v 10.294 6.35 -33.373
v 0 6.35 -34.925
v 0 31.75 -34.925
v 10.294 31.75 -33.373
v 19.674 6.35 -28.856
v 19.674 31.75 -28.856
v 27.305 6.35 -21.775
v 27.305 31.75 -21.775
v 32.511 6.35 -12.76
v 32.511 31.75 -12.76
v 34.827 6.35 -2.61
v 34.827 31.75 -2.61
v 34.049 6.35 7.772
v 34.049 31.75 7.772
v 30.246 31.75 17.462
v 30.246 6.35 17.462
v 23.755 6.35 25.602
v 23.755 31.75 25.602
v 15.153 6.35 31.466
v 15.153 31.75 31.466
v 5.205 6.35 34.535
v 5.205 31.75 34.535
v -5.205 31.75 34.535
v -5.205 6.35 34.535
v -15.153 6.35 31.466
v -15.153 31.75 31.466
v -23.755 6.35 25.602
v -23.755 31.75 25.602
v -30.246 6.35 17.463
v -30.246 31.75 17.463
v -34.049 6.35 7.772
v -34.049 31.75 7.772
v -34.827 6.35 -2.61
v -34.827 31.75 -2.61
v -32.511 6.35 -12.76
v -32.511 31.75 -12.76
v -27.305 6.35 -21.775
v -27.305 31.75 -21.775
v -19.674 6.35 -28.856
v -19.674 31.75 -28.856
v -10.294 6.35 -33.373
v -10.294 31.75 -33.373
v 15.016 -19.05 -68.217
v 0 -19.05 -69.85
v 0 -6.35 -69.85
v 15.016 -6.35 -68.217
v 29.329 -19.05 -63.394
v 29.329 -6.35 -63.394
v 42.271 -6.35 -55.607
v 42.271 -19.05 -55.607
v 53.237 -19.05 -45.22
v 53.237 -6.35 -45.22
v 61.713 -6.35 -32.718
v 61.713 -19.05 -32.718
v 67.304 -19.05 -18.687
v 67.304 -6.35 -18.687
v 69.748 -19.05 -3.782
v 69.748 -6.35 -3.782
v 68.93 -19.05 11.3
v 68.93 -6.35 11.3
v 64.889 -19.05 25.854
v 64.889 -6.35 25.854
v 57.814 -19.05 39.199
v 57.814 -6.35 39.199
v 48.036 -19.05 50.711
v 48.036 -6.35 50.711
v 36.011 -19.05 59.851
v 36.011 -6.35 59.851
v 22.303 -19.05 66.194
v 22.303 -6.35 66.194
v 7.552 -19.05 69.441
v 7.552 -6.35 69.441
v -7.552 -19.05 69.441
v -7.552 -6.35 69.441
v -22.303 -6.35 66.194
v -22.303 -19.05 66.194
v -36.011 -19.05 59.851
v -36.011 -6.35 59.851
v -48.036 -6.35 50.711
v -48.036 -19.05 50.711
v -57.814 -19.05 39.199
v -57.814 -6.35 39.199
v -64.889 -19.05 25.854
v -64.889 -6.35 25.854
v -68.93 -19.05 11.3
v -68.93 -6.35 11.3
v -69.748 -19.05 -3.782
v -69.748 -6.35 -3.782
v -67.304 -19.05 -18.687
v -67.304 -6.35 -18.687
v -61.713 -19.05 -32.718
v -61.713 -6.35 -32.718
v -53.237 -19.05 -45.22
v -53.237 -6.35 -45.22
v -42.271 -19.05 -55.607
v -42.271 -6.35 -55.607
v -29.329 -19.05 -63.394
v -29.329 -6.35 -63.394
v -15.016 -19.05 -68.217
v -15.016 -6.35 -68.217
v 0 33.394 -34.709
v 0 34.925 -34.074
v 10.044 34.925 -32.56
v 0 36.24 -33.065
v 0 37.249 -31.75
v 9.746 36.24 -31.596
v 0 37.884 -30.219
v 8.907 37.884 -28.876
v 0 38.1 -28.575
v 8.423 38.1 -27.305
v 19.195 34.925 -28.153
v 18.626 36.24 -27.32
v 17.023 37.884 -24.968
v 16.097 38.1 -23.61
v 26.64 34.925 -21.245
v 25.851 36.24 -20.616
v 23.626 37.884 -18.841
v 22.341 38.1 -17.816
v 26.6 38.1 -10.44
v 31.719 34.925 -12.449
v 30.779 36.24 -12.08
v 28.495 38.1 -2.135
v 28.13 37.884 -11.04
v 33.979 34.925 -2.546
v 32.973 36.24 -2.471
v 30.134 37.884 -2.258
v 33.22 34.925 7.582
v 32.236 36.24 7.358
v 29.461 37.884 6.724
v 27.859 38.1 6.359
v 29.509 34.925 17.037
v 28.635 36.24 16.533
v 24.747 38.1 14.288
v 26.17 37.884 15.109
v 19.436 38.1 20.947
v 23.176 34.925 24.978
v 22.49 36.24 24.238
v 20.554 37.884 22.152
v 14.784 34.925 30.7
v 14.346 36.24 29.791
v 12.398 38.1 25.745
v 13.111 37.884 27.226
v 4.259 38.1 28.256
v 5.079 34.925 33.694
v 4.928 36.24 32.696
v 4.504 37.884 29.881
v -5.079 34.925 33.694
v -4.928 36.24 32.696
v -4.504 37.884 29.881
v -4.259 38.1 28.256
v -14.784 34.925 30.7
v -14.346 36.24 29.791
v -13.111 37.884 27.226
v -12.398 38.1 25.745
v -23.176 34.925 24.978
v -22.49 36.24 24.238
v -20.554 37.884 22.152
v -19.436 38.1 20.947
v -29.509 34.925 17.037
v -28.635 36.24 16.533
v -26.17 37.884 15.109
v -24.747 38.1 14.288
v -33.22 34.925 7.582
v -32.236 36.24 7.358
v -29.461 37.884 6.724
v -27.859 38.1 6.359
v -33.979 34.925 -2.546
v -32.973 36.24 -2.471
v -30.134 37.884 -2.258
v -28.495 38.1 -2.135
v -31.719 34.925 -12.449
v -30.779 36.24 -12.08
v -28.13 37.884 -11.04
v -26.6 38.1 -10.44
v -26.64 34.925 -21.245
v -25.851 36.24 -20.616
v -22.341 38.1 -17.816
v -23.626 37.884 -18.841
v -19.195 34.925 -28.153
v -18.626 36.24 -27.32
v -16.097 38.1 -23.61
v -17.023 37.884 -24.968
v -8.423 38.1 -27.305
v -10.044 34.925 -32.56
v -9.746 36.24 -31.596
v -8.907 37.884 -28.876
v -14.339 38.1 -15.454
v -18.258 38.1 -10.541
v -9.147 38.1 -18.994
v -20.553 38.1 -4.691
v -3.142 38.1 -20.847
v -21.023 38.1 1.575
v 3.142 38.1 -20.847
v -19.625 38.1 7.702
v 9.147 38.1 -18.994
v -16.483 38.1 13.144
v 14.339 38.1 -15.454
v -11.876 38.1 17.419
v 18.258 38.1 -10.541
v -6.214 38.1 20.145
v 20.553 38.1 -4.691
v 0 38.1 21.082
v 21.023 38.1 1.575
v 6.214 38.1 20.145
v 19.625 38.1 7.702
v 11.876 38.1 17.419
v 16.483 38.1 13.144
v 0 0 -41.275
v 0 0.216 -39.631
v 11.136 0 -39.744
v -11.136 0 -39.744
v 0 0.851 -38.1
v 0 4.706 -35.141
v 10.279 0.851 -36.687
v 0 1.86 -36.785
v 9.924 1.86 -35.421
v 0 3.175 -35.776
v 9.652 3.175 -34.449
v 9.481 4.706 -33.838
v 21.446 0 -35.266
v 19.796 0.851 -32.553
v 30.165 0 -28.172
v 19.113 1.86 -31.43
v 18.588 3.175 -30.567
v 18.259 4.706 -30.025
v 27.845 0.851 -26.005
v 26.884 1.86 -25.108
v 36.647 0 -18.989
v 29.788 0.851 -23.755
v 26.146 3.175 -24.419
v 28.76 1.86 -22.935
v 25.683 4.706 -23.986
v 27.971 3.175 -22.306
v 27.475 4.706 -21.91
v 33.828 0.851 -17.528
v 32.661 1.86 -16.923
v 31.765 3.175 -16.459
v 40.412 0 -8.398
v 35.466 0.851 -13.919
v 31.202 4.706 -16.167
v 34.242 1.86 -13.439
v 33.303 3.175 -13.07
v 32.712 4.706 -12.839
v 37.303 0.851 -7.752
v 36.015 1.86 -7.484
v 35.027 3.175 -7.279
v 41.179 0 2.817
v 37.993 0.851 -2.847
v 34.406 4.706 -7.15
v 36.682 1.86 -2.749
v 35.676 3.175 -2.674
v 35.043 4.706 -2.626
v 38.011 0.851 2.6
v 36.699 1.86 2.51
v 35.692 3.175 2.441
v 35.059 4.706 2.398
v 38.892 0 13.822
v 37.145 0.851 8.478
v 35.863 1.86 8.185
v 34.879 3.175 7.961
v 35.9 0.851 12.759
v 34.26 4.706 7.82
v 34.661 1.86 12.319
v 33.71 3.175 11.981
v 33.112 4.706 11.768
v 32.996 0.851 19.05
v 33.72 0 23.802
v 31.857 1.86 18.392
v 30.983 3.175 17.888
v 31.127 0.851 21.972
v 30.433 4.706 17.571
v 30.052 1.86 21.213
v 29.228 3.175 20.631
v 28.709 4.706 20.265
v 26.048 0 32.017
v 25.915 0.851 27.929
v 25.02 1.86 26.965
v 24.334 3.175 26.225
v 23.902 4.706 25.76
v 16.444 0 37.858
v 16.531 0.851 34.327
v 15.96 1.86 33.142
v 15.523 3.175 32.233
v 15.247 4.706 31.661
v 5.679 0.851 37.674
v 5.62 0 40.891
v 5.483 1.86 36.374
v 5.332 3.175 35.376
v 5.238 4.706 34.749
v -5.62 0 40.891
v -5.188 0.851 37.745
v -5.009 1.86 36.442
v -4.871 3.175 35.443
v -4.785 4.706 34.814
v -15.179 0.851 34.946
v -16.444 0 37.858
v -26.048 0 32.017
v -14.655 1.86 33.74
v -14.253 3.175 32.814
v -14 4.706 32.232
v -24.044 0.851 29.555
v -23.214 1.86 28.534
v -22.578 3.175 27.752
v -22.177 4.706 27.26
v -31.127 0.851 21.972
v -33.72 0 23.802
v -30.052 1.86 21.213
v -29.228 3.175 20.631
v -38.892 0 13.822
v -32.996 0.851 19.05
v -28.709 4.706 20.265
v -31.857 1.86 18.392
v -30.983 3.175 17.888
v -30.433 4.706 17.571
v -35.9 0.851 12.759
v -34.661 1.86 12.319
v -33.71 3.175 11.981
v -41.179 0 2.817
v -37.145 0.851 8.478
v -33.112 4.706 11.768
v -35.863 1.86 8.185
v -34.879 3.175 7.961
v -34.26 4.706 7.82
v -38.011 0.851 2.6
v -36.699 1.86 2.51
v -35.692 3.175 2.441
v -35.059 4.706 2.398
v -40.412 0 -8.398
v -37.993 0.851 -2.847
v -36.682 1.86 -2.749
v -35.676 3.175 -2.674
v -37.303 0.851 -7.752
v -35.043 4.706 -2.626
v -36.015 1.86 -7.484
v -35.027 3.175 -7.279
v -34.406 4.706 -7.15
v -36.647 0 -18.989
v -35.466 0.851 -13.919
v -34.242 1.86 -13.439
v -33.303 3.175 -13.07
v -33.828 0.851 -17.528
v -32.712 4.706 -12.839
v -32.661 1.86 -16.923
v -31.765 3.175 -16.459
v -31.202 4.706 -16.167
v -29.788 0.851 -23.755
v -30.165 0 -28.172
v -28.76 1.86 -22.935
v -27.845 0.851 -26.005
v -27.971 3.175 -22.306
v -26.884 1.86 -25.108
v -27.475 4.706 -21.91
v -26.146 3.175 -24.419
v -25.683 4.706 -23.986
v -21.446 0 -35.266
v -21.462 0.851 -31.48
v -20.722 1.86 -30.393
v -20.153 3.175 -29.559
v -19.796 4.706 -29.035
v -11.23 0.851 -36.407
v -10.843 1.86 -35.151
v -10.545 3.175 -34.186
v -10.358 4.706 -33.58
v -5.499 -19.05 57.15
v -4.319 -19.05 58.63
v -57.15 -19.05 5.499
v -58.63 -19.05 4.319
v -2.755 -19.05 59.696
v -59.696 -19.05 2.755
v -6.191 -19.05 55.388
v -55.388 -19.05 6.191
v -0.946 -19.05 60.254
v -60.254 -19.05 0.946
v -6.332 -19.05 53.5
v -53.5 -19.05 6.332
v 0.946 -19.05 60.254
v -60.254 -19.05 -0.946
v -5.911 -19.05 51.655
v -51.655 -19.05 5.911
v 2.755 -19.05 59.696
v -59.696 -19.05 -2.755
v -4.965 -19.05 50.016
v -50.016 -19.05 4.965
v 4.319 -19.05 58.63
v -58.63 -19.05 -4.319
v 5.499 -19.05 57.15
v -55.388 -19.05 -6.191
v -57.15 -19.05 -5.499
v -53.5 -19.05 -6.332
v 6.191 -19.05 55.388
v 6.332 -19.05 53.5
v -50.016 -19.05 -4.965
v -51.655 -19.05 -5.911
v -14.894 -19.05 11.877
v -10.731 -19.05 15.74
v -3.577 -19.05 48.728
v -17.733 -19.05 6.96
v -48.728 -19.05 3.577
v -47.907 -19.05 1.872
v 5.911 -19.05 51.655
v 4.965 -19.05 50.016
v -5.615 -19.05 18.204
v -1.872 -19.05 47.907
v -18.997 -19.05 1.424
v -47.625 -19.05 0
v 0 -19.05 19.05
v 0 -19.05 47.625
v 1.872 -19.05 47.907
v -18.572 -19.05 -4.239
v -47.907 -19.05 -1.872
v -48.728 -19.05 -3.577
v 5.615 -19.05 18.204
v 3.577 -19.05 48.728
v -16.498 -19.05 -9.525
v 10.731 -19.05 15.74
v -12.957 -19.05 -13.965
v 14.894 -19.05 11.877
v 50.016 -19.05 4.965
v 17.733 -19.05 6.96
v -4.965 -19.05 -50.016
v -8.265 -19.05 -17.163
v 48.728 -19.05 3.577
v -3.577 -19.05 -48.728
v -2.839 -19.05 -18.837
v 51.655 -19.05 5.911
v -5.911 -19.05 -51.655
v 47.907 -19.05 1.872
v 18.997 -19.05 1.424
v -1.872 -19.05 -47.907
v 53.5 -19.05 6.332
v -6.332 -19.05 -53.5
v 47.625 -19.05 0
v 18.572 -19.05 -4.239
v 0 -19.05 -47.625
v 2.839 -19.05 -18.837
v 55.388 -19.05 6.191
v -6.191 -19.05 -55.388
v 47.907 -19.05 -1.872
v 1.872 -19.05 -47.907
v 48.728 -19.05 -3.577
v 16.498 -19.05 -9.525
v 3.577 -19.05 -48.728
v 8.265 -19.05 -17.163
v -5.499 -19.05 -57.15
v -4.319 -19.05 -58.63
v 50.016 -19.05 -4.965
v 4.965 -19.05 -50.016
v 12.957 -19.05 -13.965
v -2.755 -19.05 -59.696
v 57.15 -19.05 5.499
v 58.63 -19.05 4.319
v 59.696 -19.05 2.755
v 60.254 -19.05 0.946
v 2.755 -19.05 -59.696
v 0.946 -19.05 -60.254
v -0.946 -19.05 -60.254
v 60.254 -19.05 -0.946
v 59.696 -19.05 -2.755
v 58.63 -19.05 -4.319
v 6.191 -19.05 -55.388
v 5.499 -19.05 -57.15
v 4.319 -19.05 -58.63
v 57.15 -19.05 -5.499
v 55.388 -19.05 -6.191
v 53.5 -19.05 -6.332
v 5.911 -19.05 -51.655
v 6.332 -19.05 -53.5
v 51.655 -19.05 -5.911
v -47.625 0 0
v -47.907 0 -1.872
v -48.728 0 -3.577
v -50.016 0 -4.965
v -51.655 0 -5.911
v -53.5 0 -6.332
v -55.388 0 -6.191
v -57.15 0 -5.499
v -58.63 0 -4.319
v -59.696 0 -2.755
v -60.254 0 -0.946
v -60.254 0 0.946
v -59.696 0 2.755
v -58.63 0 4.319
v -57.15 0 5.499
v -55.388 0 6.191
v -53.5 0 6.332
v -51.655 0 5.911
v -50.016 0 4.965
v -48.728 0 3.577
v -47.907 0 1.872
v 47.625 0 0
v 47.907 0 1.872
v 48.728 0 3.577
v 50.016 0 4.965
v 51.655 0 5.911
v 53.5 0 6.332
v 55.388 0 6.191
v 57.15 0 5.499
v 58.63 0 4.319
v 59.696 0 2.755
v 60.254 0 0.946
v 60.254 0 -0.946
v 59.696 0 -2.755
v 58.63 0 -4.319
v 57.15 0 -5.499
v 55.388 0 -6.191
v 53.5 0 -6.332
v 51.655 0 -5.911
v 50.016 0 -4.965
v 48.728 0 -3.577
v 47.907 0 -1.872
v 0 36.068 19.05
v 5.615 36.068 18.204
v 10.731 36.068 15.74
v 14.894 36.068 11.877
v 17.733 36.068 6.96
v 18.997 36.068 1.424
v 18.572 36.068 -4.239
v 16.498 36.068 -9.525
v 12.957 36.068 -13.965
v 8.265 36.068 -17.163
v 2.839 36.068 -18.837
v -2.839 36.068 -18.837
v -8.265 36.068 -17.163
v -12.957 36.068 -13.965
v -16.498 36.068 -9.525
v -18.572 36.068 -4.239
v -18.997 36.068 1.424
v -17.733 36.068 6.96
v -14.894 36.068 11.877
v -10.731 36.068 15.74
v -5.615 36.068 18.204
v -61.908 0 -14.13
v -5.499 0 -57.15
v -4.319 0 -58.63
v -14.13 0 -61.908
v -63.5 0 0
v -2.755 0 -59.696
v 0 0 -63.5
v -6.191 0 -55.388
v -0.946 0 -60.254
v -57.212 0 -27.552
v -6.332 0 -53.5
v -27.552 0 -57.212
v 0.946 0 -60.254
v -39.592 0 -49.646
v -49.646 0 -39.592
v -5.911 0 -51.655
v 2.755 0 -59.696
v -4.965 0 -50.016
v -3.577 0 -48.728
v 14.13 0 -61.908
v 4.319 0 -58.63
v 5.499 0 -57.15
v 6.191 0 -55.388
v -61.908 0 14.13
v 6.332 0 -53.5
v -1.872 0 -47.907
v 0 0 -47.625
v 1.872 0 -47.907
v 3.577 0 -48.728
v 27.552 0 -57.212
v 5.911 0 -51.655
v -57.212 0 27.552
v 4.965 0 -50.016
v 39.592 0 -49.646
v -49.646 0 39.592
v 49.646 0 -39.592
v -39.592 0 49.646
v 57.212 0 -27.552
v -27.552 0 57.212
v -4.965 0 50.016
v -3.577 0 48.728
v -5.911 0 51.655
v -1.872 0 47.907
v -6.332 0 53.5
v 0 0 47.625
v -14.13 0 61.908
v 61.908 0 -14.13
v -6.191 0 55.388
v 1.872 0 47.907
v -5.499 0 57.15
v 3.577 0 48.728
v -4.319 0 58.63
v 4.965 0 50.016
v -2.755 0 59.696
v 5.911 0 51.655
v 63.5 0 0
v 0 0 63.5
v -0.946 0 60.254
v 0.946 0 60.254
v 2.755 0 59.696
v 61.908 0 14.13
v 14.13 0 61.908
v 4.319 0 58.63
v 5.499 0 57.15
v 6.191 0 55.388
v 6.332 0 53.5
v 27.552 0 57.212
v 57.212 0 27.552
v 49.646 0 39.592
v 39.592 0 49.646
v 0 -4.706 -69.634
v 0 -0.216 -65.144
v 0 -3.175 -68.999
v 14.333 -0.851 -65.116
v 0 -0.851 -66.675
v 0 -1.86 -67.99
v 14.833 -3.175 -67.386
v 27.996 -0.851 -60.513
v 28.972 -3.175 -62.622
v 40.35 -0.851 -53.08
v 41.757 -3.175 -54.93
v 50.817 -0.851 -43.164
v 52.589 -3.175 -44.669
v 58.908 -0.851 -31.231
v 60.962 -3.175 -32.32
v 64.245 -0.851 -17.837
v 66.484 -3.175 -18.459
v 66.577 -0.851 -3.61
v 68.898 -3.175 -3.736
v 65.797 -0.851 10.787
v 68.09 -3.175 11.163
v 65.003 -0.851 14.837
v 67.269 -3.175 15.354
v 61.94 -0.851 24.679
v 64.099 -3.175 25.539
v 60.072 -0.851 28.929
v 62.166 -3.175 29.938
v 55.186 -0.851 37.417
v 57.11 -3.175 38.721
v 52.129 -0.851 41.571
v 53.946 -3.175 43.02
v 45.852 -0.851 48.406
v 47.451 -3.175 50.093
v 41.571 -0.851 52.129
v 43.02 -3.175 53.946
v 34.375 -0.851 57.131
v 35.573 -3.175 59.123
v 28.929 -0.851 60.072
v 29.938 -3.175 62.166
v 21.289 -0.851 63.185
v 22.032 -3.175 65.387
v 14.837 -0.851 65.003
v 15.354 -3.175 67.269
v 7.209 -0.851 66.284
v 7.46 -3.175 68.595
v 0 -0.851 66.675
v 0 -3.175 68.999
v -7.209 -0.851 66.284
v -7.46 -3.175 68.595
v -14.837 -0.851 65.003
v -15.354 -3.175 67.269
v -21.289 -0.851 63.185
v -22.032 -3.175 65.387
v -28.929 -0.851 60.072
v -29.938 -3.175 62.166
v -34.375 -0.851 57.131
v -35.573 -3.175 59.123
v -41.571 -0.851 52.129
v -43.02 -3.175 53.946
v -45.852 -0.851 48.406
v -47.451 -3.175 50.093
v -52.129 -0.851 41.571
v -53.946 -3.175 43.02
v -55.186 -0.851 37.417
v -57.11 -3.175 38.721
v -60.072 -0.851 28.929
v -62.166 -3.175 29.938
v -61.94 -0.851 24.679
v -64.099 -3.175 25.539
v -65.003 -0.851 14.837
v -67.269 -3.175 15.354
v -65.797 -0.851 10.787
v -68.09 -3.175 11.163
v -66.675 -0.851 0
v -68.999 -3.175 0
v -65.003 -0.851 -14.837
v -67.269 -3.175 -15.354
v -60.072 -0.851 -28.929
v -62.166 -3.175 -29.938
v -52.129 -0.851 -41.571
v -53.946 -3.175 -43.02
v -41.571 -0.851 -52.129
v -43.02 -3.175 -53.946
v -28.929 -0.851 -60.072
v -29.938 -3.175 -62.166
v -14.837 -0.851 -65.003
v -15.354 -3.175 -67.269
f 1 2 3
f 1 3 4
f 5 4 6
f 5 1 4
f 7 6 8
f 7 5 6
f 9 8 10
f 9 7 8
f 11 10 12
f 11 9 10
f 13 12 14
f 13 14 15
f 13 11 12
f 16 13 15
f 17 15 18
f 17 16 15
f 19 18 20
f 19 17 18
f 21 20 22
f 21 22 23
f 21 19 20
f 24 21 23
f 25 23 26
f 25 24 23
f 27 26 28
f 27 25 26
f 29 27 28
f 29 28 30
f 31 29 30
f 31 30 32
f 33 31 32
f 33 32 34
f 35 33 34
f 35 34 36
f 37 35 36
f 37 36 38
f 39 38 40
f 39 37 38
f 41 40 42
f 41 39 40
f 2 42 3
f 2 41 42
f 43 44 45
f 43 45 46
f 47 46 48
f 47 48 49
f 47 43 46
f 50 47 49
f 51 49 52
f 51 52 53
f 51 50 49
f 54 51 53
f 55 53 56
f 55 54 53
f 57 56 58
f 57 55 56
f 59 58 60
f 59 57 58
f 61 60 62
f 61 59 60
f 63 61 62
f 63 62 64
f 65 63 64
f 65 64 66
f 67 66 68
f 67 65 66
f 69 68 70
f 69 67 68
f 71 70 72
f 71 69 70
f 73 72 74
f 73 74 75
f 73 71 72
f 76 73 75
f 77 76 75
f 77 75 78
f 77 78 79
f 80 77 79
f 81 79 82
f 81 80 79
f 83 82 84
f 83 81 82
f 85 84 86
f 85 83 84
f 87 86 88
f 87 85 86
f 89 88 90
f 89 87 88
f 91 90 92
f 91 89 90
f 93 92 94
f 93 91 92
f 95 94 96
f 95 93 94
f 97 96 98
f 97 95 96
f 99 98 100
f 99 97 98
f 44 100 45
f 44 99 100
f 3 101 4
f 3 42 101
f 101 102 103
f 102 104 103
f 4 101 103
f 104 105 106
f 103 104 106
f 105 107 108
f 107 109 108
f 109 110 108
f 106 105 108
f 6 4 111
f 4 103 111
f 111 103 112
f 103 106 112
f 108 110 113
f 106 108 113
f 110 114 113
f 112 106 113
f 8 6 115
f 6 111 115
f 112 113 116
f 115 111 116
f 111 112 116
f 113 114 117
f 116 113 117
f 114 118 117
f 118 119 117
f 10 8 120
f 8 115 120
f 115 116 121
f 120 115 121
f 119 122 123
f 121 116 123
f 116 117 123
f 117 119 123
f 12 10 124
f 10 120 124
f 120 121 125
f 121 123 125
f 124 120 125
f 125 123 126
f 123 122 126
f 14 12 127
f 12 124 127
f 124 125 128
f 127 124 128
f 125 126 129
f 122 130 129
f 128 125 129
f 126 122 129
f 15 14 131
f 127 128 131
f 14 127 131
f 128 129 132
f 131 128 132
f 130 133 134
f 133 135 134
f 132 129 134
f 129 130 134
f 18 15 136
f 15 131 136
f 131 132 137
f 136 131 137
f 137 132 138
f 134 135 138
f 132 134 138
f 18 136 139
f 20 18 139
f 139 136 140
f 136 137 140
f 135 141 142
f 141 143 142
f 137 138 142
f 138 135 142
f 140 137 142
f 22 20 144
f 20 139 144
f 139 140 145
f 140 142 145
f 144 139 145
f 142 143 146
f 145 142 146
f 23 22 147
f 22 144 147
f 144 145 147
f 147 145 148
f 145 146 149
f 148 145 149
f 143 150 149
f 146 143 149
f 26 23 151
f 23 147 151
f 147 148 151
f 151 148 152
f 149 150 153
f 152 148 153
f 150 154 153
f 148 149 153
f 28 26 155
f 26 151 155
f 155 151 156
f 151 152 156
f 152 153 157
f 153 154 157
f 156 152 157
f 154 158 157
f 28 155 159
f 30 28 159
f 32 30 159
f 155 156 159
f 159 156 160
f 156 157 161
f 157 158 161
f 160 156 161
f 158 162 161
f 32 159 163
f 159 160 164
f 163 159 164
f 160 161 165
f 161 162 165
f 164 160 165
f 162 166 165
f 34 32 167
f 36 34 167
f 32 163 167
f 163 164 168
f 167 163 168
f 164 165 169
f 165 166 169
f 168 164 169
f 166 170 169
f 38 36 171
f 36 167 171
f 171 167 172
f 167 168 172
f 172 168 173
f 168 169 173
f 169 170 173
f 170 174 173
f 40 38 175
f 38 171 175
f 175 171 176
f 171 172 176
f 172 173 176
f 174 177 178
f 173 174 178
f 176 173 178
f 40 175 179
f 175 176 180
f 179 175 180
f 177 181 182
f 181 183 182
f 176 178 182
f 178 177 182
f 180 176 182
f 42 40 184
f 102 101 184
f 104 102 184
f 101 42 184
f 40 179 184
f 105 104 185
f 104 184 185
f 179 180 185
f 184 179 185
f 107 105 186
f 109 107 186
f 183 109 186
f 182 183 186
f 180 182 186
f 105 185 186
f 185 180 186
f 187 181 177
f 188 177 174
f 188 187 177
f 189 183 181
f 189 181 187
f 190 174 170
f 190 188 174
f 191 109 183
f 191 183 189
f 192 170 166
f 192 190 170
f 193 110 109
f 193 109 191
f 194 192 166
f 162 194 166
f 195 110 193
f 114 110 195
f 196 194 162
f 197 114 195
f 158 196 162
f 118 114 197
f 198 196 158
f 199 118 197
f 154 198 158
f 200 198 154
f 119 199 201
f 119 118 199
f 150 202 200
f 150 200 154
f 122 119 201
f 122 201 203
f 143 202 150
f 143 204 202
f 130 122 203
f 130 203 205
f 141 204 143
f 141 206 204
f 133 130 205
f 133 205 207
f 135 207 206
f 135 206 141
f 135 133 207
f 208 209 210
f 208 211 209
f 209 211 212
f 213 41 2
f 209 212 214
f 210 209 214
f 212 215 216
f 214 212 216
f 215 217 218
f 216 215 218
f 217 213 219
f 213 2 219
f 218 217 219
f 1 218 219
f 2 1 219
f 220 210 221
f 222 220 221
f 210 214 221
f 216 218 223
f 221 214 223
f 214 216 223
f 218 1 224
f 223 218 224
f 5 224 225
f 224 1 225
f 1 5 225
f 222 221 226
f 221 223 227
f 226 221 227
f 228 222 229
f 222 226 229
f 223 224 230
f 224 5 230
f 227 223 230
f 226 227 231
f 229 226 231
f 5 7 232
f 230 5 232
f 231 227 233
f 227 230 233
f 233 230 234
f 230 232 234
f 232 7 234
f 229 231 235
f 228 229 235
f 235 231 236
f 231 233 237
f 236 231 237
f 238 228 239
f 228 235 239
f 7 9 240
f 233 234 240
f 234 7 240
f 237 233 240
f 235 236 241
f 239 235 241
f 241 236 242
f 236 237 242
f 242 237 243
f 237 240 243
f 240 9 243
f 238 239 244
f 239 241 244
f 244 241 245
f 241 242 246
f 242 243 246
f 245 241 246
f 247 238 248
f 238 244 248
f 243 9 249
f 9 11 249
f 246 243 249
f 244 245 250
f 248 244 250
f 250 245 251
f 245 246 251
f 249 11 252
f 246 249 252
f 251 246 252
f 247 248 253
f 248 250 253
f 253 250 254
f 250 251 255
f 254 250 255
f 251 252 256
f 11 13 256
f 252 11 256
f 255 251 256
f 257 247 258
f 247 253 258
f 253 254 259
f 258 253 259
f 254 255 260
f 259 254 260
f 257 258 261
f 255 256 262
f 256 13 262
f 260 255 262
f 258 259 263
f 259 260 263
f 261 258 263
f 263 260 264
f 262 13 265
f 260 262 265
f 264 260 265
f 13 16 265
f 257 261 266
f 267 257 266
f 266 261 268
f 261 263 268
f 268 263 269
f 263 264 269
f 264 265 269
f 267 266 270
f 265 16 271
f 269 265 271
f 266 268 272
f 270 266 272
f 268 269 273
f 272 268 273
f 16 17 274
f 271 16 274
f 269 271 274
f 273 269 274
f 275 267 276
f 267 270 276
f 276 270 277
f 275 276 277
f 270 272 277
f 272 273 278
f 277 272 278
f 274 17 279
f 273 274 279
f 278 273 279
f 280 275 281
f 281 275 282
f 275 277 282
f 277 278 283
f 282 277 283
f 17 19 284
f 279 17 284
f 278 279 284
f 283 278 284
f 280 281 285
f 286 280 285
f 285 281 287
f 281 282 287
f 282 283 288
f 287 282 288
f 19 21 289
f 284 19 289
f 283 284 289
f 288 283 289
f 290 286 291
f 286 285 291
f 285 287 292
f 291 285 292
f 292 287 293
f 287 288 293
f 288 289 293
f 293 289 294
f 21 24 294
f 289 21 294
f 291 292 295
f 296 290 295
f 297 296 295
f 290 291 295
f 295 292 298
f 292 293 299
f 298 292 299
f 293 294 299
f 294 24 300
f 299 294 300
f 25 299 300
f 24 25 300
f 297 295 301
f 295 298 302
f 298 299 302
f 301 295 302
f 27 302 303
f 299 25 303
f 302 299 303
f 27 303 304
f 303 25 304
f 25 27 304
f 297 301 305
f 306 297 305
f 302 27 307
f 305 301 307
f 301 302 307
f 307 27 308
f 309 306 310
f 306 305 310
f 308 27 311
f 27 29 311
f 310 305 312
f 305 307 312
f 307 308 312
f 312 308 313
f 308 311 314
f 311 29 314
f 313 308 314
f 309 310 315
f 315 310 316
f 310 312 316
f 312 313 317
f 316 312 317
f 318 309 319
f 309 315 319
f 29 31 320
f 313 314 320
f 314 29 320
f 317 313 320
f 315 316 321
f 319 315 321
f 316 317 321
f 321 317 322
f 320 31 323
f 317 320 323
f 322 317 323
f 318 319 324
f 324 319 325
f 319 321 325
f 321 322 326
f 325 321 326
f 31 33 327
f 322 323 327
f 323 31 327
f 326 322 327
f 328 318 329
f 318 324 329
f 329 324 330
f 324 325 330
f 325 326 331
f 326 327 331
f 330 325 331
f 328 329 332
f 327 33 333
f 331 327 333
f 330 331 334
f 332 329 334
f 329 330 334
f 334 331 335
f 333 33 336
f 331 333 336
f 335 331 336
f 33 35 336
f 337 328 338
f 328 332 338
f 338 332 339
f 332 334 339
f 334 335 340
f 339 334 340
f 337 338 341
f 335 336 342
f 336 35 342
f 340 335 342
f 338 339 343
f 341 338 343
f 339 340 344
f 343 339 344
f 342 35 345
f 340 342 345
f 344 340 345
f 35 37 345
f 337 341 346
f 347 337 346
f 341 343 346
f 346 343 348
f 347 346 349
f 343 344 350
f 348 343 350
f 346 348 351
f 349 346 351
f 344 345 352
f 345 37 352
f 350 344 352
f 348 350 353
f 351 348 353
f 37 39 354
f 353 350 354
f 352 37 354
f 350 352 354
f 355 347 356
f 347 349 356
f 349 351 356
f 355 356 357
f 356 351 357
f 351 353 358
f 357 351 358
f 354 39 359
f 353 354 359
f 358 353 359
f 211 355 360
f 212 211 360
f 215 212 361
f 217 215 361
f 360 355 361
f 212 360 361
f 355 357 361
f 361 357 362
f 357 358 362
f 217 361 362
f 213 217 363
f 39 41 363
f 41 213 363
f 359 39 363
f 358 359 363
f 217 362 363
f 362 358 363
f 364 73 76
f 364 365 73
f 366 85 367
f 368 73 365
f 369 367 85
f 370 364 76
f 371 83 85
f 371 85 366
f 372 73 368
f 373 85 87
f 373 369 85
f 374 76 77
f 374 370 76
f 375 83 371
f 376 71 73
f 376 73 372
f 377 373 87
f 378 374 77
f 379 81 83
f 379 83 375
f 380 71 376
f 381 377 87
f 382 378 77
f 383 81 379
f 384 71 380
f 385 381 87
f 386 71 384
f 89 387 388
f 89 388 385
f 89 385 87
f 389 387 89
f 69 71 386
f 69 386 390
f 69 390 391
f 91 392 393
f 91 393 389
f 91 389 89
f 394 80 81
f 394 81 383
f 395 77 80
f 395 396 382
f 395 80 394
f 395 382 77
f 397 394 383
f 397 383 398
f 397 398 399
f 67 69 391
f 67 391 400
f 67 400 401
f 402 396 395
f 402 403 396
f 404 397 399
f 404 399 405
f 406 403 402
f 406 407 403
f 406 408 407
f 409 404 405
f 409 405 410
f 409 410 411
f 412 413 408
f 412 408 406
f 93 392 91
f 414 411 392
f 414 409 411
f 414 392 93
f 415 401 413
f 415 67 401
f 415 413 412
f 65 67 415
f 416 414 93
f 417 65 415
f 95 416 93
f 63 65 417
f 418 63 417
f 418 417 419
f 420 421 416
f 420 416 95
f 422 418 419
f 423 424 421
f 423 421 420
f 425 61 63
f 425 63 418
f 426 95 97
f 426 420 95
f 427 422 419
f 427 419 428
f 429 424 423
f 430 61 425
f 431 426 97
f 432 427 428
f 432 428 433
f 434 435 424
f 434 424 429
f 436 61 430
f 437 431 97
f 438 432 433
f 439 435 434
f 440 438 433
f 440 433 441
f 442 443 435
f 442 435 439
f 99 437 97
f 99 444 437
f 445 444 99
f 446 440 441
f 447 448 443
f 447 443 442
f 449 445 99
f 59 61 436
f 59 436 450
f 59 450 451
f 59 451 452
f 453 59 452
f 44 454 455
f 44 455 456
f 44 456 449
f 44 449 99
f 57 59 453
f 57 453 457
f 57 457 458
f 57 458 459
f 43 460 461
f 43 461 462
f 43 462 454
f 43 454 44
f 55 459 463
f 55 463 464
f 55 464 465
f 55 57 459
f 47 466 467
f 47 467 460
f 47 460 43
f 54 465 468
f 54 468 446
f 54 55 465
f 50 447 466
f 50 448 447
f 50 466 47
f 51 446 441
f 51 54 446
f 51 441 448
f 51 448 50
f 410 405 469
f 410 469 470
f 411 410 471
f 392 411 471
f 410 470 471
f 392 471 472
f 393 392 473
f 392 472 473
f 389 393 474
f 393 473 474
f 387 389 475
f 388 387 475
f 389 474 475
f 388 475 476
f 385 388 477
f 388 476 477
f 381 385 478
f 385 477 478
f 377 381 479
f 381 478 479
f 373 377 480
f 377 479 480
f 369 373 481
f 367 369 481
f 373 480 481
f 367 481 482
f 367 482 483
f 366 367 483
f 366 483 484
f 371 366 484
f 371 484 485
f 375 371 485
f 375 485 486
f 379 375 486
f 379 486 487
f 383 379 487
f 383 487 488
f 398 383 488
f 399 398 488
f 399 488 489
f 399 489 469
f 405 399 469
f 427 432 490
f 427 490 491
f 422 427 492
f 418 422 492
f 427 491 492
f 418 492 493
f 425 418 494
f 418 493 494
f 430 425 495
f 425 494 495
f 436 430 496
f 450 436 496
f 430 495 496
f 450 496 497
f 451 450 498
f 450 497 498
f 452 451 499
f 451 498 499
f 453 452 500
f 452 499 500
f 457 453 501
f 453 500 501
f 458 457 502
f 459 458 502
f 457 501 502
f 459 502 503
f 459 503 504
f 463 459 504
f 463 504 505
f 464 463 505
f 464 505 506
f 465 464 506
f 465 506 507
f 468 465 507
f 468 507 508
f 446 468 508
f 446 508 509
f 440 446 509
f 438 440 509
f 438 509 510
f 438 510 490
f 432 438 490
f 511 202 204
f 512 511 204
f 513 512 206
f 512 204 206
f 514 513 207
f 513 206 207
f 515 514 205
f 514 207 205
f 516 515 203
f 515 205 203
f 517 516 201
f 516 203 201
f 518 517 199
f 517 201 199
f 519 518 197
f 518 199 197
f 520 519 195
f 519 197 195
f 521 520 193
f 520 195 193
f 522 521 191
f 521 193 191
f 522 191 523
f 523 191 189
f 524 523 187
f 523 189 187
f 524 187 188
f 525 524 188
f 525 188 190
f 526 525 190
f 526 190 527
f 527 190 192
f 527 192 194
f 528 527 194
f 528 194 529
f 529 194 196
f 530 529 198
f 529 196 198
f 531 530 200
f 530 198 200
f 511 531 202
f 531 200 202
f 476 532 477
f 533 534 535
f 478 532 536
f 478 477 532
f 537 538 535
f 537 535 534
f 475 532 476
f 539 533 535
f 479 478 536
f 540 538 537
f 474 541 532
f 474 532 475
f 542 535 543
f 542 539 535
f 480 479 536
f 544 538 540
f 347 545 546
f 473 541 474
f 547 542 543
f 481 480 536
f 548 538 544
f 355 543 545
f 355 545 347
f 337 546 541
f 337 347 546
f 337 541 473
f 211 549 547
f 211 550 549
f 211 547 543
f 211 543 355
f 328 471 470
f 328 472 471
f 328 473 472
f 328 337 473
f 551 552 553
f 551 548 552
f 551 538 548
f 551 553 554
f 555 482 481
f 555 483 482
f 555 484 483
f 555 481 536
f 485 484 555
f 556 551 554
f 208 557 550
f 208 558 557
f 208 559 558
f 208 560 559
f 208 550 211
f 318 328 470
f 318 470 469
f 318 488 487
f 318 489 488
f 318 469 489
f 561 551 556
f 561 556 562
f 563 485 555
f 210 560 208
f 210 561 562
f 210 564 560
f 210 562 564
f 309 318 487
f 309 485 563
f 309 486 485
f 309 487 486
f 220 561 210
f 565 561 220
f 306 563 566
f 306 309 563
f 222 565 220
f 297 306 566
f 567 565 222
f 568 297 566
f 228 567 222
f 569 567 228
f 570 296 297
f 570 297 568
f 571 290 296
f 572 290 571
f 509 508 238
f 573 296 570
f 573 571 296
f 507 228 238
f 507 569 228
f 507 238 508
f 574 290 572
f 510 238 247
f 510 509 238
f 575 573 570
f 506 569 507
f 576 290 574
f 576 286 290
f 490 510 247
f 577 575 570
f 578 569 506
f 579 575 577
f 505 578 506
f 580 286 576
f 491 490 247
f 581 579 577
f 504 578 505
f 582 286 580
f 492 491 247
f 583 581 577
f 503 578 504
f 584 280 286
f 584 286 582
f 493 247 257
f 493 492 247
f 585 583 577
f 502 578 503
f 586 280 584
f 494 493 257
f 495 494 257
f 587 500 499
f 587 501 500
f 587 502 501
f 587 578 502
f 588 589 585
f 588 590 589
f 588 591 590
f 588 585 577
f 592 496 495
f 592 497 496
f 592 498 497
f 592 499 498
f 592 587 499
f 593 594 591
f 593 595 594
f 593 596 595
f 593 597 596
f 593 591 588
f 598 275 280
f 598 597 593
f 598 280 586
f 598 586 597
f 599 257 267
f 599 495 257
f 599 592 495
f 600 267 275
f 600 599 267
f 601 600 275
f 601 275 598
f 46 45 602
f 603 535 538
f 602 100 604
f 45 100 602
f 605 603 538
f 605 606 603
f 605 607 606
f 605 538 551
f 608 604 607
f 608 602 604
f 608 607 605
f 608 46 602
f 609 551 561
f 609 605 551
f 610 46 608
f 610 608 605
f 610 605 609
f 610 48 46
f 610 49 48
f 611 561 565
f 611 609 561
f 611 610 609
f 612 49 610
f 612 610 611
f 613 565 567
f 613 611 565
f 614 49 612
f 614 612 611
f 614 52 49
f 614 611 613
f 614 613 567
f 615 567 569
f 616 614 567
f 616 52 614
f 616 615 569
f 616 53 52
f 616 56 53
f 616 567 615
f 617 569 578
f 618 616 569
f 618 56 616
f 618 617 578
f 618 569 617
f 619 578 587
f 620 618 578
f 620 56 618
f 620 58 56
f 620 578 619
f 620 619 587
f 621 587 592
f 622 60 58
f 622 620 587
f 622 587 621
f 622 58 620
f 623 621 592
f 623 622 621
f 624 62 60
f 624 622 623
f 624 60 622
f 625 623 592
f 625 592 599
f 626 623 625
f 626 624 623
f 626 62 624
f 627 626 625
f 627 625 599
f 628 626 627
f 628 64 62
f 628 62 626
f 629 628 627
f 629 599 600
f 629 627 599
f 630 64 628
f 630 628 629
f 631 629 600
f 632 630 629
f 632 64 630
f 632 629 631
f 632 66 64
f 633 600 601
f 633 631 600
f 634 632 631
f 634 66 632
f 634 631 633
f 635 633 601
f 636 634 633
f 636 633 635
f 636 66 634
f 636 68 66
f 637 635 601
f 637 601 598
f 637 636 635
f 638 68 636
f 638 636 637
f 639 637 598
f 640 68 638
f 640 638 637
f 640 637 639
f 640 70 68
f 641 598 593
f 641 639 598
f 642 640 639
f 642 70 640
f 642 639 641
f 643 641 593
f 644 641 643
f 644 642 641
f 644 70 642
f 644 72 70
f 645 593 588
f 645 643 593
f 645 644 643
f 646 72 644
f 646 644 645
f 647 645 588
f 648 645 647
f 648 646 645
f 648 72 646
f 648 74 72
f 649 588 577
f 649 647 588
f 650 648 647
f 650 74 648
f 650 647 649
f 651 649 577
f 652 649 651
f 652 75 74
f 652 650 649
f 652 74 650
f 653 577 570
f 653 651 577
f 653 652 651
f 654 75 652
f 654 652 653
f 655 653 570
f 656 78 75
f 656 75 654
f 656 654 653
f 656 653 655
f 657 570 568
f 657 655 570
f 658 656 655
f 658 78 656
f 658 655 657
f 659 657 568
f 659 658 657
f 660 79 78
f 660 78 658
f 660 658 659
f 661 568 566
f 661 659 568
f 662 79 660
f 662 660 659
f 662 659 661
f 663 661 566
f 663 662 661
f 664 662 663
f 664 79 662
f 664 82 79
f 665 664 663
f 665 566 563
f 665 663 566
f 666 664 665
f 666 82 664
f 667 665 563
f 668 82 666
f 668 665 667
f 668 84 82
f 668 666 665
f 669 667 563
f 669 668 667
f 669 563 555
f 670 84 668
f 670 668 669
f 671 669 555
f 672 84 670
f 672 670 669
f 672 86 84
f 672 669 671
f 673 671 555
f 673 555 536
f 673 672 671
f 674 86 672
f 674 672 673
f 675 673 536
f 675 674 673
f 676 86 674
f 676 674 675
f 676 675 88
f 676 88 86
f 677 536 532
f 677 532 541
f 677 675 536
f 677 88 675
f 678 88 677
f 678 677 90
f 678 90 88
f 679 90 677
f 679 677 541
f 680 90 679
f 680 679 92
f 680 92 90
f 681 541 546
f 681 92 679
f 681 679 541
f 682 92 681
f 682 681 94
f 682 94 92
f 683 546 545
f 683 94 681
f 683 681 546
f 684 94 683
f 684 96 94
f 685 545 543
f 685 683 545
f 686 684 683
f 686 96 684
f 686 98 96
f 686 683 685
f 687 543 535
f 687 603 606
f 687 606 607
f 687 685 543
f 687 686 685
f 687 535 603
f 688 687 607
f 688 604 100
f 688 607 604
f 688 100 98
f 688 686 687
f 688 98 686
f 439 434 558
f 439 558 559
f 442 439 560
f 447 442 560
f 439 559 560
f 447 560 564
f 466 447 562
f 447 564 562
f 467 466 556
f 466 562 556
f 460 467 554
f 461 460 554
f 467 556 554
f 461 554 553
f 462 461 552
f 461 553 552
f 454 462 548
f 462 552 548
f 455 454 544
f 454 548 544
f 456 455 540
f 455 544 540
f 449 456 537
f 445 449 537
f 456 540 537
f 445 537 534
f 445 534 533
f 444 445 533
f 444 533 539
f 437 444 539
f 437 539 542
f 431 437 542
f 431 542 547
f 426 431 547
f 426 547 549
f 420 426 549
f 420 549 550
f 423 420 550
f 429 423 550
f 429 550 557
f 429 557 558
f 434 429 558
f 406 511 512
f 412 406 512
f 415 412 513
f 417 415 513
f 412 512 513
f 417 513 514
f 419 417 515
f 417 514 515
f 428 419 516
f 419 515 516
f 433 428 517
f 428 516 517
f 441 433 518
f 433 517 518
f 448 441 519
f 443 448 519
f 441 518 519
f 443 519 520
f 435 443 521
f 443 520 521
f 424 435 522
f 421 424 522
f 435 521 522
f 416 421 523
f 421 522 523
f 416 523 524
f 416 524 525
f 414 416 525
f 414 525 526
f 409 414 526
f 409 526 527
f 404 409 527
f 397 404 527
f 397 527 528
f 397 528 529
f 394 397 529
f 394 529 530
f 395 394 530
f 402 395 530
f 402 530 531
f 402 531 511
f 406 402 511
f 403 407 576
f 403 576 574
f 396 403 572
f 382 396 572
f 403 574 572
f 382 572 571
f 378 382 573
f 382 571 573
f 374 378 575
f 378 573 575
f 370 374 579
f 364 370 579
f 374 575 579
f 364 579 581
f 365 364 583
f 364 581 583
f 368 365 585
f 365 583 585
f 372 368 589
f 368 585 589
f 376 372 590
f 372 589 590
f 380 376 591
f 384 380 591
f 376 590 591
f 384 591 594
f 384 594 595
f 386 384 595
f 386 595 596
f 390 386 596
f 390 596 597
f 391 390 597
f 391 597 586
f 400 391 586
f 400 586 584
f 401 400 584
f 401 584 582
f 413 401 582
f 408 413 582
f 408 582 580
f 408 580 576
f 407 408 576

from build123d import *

# Parameters (mm, degrees)
SKETCH8_R          = 19.05
CUT_EXTRUDE2_DEPTH = 115.123474798
SKETCH9_R          = 6.35
CUT_EXTRUDE3_DEPTH = 106.875658203
CIRPATTERN1_COUNT  = 4
FILLET1_R          = 6.35
CHAMFER1_SIZE      = 2.032


with BuildPart() as part:
    # Sketch7 → Revolve1 (revolve)
    with BuildSketch(Plane.XY, mode=Mode.PRIVATE) as revolve1_sk:
        Polygon((34.925, 0), (69.85, 0), (69.85, -19.05), (0, -19.05), (0, 0), (0, 38.1), (34.925, 38.1), align=None)
    revolve(revolve1_sk.sketch.rotate(Axis((0, 38.1, 0), (0, -1, 0)), 270), axis=Axis((0, 38.1, 0), (0, -1, 0)))

    # Sketch8 → Cut-Extrude2 (cut, through all)
    with BuildSketch(Plane(origin=(0, 38.1, 0), x_dir=(1, 0, 0), z_dir=(0, 1, 0))):
        with Locations(Location((0, 0, 0), (0, 0, 270))):
            Circle(SKETCH8_R)
    extrude(amount=-CUT_EXTRUDE2_DEPTH, mode=Mode.SUBTRACT)

    # Sketch9 → Cut-Extrude3 (cut, through all)
    with BuildSketch(Plane(origin=(0, 0, 0), x_dir=(1, 0, 0), z_dir=(0, 1, 0))):
        with Locations(Location((0, 53.975, 0), (0, 0, 270))):
            Circle(SKETCH9_R)
    cut_extrude3 = extrude(amount=-CUT_EXTRUDE3_DEPTH, mode=Mode.SUBTRACT)

    # CirPattern1: Cut-Extrude3 ×4 about axis
    cirpattern1_axis = Axis((0, 0, 0), (0, 1, 0))
    for i in range(1, CIRPATTERN1_COUNT):
        add(cut_extrude3.rotate(cirpattern1_axis, i * 360 / CIRPATTERN1_COUNT), mode=Mode.SUBTRACT)

    # Fillet1
    fillet1_edges = [part.edges().sort_by_distance(p)[0] for p in [
        (0, 38.1, 34.925),
        (0, 0, 34.925),
        (0, 0, 69.85),
    ]]
    fillet(fillet1_edges, radius=FILLET1_R)

    # Chamfer1
    chamfer1_edges = [part.edges().sort_by_distance(p)[0] for p in [
        (0, 38.1, -19.05),
    ]]
    chamfer(chamfer1_edges, length=CHAMFER1_SIZE)


solid = part.part
